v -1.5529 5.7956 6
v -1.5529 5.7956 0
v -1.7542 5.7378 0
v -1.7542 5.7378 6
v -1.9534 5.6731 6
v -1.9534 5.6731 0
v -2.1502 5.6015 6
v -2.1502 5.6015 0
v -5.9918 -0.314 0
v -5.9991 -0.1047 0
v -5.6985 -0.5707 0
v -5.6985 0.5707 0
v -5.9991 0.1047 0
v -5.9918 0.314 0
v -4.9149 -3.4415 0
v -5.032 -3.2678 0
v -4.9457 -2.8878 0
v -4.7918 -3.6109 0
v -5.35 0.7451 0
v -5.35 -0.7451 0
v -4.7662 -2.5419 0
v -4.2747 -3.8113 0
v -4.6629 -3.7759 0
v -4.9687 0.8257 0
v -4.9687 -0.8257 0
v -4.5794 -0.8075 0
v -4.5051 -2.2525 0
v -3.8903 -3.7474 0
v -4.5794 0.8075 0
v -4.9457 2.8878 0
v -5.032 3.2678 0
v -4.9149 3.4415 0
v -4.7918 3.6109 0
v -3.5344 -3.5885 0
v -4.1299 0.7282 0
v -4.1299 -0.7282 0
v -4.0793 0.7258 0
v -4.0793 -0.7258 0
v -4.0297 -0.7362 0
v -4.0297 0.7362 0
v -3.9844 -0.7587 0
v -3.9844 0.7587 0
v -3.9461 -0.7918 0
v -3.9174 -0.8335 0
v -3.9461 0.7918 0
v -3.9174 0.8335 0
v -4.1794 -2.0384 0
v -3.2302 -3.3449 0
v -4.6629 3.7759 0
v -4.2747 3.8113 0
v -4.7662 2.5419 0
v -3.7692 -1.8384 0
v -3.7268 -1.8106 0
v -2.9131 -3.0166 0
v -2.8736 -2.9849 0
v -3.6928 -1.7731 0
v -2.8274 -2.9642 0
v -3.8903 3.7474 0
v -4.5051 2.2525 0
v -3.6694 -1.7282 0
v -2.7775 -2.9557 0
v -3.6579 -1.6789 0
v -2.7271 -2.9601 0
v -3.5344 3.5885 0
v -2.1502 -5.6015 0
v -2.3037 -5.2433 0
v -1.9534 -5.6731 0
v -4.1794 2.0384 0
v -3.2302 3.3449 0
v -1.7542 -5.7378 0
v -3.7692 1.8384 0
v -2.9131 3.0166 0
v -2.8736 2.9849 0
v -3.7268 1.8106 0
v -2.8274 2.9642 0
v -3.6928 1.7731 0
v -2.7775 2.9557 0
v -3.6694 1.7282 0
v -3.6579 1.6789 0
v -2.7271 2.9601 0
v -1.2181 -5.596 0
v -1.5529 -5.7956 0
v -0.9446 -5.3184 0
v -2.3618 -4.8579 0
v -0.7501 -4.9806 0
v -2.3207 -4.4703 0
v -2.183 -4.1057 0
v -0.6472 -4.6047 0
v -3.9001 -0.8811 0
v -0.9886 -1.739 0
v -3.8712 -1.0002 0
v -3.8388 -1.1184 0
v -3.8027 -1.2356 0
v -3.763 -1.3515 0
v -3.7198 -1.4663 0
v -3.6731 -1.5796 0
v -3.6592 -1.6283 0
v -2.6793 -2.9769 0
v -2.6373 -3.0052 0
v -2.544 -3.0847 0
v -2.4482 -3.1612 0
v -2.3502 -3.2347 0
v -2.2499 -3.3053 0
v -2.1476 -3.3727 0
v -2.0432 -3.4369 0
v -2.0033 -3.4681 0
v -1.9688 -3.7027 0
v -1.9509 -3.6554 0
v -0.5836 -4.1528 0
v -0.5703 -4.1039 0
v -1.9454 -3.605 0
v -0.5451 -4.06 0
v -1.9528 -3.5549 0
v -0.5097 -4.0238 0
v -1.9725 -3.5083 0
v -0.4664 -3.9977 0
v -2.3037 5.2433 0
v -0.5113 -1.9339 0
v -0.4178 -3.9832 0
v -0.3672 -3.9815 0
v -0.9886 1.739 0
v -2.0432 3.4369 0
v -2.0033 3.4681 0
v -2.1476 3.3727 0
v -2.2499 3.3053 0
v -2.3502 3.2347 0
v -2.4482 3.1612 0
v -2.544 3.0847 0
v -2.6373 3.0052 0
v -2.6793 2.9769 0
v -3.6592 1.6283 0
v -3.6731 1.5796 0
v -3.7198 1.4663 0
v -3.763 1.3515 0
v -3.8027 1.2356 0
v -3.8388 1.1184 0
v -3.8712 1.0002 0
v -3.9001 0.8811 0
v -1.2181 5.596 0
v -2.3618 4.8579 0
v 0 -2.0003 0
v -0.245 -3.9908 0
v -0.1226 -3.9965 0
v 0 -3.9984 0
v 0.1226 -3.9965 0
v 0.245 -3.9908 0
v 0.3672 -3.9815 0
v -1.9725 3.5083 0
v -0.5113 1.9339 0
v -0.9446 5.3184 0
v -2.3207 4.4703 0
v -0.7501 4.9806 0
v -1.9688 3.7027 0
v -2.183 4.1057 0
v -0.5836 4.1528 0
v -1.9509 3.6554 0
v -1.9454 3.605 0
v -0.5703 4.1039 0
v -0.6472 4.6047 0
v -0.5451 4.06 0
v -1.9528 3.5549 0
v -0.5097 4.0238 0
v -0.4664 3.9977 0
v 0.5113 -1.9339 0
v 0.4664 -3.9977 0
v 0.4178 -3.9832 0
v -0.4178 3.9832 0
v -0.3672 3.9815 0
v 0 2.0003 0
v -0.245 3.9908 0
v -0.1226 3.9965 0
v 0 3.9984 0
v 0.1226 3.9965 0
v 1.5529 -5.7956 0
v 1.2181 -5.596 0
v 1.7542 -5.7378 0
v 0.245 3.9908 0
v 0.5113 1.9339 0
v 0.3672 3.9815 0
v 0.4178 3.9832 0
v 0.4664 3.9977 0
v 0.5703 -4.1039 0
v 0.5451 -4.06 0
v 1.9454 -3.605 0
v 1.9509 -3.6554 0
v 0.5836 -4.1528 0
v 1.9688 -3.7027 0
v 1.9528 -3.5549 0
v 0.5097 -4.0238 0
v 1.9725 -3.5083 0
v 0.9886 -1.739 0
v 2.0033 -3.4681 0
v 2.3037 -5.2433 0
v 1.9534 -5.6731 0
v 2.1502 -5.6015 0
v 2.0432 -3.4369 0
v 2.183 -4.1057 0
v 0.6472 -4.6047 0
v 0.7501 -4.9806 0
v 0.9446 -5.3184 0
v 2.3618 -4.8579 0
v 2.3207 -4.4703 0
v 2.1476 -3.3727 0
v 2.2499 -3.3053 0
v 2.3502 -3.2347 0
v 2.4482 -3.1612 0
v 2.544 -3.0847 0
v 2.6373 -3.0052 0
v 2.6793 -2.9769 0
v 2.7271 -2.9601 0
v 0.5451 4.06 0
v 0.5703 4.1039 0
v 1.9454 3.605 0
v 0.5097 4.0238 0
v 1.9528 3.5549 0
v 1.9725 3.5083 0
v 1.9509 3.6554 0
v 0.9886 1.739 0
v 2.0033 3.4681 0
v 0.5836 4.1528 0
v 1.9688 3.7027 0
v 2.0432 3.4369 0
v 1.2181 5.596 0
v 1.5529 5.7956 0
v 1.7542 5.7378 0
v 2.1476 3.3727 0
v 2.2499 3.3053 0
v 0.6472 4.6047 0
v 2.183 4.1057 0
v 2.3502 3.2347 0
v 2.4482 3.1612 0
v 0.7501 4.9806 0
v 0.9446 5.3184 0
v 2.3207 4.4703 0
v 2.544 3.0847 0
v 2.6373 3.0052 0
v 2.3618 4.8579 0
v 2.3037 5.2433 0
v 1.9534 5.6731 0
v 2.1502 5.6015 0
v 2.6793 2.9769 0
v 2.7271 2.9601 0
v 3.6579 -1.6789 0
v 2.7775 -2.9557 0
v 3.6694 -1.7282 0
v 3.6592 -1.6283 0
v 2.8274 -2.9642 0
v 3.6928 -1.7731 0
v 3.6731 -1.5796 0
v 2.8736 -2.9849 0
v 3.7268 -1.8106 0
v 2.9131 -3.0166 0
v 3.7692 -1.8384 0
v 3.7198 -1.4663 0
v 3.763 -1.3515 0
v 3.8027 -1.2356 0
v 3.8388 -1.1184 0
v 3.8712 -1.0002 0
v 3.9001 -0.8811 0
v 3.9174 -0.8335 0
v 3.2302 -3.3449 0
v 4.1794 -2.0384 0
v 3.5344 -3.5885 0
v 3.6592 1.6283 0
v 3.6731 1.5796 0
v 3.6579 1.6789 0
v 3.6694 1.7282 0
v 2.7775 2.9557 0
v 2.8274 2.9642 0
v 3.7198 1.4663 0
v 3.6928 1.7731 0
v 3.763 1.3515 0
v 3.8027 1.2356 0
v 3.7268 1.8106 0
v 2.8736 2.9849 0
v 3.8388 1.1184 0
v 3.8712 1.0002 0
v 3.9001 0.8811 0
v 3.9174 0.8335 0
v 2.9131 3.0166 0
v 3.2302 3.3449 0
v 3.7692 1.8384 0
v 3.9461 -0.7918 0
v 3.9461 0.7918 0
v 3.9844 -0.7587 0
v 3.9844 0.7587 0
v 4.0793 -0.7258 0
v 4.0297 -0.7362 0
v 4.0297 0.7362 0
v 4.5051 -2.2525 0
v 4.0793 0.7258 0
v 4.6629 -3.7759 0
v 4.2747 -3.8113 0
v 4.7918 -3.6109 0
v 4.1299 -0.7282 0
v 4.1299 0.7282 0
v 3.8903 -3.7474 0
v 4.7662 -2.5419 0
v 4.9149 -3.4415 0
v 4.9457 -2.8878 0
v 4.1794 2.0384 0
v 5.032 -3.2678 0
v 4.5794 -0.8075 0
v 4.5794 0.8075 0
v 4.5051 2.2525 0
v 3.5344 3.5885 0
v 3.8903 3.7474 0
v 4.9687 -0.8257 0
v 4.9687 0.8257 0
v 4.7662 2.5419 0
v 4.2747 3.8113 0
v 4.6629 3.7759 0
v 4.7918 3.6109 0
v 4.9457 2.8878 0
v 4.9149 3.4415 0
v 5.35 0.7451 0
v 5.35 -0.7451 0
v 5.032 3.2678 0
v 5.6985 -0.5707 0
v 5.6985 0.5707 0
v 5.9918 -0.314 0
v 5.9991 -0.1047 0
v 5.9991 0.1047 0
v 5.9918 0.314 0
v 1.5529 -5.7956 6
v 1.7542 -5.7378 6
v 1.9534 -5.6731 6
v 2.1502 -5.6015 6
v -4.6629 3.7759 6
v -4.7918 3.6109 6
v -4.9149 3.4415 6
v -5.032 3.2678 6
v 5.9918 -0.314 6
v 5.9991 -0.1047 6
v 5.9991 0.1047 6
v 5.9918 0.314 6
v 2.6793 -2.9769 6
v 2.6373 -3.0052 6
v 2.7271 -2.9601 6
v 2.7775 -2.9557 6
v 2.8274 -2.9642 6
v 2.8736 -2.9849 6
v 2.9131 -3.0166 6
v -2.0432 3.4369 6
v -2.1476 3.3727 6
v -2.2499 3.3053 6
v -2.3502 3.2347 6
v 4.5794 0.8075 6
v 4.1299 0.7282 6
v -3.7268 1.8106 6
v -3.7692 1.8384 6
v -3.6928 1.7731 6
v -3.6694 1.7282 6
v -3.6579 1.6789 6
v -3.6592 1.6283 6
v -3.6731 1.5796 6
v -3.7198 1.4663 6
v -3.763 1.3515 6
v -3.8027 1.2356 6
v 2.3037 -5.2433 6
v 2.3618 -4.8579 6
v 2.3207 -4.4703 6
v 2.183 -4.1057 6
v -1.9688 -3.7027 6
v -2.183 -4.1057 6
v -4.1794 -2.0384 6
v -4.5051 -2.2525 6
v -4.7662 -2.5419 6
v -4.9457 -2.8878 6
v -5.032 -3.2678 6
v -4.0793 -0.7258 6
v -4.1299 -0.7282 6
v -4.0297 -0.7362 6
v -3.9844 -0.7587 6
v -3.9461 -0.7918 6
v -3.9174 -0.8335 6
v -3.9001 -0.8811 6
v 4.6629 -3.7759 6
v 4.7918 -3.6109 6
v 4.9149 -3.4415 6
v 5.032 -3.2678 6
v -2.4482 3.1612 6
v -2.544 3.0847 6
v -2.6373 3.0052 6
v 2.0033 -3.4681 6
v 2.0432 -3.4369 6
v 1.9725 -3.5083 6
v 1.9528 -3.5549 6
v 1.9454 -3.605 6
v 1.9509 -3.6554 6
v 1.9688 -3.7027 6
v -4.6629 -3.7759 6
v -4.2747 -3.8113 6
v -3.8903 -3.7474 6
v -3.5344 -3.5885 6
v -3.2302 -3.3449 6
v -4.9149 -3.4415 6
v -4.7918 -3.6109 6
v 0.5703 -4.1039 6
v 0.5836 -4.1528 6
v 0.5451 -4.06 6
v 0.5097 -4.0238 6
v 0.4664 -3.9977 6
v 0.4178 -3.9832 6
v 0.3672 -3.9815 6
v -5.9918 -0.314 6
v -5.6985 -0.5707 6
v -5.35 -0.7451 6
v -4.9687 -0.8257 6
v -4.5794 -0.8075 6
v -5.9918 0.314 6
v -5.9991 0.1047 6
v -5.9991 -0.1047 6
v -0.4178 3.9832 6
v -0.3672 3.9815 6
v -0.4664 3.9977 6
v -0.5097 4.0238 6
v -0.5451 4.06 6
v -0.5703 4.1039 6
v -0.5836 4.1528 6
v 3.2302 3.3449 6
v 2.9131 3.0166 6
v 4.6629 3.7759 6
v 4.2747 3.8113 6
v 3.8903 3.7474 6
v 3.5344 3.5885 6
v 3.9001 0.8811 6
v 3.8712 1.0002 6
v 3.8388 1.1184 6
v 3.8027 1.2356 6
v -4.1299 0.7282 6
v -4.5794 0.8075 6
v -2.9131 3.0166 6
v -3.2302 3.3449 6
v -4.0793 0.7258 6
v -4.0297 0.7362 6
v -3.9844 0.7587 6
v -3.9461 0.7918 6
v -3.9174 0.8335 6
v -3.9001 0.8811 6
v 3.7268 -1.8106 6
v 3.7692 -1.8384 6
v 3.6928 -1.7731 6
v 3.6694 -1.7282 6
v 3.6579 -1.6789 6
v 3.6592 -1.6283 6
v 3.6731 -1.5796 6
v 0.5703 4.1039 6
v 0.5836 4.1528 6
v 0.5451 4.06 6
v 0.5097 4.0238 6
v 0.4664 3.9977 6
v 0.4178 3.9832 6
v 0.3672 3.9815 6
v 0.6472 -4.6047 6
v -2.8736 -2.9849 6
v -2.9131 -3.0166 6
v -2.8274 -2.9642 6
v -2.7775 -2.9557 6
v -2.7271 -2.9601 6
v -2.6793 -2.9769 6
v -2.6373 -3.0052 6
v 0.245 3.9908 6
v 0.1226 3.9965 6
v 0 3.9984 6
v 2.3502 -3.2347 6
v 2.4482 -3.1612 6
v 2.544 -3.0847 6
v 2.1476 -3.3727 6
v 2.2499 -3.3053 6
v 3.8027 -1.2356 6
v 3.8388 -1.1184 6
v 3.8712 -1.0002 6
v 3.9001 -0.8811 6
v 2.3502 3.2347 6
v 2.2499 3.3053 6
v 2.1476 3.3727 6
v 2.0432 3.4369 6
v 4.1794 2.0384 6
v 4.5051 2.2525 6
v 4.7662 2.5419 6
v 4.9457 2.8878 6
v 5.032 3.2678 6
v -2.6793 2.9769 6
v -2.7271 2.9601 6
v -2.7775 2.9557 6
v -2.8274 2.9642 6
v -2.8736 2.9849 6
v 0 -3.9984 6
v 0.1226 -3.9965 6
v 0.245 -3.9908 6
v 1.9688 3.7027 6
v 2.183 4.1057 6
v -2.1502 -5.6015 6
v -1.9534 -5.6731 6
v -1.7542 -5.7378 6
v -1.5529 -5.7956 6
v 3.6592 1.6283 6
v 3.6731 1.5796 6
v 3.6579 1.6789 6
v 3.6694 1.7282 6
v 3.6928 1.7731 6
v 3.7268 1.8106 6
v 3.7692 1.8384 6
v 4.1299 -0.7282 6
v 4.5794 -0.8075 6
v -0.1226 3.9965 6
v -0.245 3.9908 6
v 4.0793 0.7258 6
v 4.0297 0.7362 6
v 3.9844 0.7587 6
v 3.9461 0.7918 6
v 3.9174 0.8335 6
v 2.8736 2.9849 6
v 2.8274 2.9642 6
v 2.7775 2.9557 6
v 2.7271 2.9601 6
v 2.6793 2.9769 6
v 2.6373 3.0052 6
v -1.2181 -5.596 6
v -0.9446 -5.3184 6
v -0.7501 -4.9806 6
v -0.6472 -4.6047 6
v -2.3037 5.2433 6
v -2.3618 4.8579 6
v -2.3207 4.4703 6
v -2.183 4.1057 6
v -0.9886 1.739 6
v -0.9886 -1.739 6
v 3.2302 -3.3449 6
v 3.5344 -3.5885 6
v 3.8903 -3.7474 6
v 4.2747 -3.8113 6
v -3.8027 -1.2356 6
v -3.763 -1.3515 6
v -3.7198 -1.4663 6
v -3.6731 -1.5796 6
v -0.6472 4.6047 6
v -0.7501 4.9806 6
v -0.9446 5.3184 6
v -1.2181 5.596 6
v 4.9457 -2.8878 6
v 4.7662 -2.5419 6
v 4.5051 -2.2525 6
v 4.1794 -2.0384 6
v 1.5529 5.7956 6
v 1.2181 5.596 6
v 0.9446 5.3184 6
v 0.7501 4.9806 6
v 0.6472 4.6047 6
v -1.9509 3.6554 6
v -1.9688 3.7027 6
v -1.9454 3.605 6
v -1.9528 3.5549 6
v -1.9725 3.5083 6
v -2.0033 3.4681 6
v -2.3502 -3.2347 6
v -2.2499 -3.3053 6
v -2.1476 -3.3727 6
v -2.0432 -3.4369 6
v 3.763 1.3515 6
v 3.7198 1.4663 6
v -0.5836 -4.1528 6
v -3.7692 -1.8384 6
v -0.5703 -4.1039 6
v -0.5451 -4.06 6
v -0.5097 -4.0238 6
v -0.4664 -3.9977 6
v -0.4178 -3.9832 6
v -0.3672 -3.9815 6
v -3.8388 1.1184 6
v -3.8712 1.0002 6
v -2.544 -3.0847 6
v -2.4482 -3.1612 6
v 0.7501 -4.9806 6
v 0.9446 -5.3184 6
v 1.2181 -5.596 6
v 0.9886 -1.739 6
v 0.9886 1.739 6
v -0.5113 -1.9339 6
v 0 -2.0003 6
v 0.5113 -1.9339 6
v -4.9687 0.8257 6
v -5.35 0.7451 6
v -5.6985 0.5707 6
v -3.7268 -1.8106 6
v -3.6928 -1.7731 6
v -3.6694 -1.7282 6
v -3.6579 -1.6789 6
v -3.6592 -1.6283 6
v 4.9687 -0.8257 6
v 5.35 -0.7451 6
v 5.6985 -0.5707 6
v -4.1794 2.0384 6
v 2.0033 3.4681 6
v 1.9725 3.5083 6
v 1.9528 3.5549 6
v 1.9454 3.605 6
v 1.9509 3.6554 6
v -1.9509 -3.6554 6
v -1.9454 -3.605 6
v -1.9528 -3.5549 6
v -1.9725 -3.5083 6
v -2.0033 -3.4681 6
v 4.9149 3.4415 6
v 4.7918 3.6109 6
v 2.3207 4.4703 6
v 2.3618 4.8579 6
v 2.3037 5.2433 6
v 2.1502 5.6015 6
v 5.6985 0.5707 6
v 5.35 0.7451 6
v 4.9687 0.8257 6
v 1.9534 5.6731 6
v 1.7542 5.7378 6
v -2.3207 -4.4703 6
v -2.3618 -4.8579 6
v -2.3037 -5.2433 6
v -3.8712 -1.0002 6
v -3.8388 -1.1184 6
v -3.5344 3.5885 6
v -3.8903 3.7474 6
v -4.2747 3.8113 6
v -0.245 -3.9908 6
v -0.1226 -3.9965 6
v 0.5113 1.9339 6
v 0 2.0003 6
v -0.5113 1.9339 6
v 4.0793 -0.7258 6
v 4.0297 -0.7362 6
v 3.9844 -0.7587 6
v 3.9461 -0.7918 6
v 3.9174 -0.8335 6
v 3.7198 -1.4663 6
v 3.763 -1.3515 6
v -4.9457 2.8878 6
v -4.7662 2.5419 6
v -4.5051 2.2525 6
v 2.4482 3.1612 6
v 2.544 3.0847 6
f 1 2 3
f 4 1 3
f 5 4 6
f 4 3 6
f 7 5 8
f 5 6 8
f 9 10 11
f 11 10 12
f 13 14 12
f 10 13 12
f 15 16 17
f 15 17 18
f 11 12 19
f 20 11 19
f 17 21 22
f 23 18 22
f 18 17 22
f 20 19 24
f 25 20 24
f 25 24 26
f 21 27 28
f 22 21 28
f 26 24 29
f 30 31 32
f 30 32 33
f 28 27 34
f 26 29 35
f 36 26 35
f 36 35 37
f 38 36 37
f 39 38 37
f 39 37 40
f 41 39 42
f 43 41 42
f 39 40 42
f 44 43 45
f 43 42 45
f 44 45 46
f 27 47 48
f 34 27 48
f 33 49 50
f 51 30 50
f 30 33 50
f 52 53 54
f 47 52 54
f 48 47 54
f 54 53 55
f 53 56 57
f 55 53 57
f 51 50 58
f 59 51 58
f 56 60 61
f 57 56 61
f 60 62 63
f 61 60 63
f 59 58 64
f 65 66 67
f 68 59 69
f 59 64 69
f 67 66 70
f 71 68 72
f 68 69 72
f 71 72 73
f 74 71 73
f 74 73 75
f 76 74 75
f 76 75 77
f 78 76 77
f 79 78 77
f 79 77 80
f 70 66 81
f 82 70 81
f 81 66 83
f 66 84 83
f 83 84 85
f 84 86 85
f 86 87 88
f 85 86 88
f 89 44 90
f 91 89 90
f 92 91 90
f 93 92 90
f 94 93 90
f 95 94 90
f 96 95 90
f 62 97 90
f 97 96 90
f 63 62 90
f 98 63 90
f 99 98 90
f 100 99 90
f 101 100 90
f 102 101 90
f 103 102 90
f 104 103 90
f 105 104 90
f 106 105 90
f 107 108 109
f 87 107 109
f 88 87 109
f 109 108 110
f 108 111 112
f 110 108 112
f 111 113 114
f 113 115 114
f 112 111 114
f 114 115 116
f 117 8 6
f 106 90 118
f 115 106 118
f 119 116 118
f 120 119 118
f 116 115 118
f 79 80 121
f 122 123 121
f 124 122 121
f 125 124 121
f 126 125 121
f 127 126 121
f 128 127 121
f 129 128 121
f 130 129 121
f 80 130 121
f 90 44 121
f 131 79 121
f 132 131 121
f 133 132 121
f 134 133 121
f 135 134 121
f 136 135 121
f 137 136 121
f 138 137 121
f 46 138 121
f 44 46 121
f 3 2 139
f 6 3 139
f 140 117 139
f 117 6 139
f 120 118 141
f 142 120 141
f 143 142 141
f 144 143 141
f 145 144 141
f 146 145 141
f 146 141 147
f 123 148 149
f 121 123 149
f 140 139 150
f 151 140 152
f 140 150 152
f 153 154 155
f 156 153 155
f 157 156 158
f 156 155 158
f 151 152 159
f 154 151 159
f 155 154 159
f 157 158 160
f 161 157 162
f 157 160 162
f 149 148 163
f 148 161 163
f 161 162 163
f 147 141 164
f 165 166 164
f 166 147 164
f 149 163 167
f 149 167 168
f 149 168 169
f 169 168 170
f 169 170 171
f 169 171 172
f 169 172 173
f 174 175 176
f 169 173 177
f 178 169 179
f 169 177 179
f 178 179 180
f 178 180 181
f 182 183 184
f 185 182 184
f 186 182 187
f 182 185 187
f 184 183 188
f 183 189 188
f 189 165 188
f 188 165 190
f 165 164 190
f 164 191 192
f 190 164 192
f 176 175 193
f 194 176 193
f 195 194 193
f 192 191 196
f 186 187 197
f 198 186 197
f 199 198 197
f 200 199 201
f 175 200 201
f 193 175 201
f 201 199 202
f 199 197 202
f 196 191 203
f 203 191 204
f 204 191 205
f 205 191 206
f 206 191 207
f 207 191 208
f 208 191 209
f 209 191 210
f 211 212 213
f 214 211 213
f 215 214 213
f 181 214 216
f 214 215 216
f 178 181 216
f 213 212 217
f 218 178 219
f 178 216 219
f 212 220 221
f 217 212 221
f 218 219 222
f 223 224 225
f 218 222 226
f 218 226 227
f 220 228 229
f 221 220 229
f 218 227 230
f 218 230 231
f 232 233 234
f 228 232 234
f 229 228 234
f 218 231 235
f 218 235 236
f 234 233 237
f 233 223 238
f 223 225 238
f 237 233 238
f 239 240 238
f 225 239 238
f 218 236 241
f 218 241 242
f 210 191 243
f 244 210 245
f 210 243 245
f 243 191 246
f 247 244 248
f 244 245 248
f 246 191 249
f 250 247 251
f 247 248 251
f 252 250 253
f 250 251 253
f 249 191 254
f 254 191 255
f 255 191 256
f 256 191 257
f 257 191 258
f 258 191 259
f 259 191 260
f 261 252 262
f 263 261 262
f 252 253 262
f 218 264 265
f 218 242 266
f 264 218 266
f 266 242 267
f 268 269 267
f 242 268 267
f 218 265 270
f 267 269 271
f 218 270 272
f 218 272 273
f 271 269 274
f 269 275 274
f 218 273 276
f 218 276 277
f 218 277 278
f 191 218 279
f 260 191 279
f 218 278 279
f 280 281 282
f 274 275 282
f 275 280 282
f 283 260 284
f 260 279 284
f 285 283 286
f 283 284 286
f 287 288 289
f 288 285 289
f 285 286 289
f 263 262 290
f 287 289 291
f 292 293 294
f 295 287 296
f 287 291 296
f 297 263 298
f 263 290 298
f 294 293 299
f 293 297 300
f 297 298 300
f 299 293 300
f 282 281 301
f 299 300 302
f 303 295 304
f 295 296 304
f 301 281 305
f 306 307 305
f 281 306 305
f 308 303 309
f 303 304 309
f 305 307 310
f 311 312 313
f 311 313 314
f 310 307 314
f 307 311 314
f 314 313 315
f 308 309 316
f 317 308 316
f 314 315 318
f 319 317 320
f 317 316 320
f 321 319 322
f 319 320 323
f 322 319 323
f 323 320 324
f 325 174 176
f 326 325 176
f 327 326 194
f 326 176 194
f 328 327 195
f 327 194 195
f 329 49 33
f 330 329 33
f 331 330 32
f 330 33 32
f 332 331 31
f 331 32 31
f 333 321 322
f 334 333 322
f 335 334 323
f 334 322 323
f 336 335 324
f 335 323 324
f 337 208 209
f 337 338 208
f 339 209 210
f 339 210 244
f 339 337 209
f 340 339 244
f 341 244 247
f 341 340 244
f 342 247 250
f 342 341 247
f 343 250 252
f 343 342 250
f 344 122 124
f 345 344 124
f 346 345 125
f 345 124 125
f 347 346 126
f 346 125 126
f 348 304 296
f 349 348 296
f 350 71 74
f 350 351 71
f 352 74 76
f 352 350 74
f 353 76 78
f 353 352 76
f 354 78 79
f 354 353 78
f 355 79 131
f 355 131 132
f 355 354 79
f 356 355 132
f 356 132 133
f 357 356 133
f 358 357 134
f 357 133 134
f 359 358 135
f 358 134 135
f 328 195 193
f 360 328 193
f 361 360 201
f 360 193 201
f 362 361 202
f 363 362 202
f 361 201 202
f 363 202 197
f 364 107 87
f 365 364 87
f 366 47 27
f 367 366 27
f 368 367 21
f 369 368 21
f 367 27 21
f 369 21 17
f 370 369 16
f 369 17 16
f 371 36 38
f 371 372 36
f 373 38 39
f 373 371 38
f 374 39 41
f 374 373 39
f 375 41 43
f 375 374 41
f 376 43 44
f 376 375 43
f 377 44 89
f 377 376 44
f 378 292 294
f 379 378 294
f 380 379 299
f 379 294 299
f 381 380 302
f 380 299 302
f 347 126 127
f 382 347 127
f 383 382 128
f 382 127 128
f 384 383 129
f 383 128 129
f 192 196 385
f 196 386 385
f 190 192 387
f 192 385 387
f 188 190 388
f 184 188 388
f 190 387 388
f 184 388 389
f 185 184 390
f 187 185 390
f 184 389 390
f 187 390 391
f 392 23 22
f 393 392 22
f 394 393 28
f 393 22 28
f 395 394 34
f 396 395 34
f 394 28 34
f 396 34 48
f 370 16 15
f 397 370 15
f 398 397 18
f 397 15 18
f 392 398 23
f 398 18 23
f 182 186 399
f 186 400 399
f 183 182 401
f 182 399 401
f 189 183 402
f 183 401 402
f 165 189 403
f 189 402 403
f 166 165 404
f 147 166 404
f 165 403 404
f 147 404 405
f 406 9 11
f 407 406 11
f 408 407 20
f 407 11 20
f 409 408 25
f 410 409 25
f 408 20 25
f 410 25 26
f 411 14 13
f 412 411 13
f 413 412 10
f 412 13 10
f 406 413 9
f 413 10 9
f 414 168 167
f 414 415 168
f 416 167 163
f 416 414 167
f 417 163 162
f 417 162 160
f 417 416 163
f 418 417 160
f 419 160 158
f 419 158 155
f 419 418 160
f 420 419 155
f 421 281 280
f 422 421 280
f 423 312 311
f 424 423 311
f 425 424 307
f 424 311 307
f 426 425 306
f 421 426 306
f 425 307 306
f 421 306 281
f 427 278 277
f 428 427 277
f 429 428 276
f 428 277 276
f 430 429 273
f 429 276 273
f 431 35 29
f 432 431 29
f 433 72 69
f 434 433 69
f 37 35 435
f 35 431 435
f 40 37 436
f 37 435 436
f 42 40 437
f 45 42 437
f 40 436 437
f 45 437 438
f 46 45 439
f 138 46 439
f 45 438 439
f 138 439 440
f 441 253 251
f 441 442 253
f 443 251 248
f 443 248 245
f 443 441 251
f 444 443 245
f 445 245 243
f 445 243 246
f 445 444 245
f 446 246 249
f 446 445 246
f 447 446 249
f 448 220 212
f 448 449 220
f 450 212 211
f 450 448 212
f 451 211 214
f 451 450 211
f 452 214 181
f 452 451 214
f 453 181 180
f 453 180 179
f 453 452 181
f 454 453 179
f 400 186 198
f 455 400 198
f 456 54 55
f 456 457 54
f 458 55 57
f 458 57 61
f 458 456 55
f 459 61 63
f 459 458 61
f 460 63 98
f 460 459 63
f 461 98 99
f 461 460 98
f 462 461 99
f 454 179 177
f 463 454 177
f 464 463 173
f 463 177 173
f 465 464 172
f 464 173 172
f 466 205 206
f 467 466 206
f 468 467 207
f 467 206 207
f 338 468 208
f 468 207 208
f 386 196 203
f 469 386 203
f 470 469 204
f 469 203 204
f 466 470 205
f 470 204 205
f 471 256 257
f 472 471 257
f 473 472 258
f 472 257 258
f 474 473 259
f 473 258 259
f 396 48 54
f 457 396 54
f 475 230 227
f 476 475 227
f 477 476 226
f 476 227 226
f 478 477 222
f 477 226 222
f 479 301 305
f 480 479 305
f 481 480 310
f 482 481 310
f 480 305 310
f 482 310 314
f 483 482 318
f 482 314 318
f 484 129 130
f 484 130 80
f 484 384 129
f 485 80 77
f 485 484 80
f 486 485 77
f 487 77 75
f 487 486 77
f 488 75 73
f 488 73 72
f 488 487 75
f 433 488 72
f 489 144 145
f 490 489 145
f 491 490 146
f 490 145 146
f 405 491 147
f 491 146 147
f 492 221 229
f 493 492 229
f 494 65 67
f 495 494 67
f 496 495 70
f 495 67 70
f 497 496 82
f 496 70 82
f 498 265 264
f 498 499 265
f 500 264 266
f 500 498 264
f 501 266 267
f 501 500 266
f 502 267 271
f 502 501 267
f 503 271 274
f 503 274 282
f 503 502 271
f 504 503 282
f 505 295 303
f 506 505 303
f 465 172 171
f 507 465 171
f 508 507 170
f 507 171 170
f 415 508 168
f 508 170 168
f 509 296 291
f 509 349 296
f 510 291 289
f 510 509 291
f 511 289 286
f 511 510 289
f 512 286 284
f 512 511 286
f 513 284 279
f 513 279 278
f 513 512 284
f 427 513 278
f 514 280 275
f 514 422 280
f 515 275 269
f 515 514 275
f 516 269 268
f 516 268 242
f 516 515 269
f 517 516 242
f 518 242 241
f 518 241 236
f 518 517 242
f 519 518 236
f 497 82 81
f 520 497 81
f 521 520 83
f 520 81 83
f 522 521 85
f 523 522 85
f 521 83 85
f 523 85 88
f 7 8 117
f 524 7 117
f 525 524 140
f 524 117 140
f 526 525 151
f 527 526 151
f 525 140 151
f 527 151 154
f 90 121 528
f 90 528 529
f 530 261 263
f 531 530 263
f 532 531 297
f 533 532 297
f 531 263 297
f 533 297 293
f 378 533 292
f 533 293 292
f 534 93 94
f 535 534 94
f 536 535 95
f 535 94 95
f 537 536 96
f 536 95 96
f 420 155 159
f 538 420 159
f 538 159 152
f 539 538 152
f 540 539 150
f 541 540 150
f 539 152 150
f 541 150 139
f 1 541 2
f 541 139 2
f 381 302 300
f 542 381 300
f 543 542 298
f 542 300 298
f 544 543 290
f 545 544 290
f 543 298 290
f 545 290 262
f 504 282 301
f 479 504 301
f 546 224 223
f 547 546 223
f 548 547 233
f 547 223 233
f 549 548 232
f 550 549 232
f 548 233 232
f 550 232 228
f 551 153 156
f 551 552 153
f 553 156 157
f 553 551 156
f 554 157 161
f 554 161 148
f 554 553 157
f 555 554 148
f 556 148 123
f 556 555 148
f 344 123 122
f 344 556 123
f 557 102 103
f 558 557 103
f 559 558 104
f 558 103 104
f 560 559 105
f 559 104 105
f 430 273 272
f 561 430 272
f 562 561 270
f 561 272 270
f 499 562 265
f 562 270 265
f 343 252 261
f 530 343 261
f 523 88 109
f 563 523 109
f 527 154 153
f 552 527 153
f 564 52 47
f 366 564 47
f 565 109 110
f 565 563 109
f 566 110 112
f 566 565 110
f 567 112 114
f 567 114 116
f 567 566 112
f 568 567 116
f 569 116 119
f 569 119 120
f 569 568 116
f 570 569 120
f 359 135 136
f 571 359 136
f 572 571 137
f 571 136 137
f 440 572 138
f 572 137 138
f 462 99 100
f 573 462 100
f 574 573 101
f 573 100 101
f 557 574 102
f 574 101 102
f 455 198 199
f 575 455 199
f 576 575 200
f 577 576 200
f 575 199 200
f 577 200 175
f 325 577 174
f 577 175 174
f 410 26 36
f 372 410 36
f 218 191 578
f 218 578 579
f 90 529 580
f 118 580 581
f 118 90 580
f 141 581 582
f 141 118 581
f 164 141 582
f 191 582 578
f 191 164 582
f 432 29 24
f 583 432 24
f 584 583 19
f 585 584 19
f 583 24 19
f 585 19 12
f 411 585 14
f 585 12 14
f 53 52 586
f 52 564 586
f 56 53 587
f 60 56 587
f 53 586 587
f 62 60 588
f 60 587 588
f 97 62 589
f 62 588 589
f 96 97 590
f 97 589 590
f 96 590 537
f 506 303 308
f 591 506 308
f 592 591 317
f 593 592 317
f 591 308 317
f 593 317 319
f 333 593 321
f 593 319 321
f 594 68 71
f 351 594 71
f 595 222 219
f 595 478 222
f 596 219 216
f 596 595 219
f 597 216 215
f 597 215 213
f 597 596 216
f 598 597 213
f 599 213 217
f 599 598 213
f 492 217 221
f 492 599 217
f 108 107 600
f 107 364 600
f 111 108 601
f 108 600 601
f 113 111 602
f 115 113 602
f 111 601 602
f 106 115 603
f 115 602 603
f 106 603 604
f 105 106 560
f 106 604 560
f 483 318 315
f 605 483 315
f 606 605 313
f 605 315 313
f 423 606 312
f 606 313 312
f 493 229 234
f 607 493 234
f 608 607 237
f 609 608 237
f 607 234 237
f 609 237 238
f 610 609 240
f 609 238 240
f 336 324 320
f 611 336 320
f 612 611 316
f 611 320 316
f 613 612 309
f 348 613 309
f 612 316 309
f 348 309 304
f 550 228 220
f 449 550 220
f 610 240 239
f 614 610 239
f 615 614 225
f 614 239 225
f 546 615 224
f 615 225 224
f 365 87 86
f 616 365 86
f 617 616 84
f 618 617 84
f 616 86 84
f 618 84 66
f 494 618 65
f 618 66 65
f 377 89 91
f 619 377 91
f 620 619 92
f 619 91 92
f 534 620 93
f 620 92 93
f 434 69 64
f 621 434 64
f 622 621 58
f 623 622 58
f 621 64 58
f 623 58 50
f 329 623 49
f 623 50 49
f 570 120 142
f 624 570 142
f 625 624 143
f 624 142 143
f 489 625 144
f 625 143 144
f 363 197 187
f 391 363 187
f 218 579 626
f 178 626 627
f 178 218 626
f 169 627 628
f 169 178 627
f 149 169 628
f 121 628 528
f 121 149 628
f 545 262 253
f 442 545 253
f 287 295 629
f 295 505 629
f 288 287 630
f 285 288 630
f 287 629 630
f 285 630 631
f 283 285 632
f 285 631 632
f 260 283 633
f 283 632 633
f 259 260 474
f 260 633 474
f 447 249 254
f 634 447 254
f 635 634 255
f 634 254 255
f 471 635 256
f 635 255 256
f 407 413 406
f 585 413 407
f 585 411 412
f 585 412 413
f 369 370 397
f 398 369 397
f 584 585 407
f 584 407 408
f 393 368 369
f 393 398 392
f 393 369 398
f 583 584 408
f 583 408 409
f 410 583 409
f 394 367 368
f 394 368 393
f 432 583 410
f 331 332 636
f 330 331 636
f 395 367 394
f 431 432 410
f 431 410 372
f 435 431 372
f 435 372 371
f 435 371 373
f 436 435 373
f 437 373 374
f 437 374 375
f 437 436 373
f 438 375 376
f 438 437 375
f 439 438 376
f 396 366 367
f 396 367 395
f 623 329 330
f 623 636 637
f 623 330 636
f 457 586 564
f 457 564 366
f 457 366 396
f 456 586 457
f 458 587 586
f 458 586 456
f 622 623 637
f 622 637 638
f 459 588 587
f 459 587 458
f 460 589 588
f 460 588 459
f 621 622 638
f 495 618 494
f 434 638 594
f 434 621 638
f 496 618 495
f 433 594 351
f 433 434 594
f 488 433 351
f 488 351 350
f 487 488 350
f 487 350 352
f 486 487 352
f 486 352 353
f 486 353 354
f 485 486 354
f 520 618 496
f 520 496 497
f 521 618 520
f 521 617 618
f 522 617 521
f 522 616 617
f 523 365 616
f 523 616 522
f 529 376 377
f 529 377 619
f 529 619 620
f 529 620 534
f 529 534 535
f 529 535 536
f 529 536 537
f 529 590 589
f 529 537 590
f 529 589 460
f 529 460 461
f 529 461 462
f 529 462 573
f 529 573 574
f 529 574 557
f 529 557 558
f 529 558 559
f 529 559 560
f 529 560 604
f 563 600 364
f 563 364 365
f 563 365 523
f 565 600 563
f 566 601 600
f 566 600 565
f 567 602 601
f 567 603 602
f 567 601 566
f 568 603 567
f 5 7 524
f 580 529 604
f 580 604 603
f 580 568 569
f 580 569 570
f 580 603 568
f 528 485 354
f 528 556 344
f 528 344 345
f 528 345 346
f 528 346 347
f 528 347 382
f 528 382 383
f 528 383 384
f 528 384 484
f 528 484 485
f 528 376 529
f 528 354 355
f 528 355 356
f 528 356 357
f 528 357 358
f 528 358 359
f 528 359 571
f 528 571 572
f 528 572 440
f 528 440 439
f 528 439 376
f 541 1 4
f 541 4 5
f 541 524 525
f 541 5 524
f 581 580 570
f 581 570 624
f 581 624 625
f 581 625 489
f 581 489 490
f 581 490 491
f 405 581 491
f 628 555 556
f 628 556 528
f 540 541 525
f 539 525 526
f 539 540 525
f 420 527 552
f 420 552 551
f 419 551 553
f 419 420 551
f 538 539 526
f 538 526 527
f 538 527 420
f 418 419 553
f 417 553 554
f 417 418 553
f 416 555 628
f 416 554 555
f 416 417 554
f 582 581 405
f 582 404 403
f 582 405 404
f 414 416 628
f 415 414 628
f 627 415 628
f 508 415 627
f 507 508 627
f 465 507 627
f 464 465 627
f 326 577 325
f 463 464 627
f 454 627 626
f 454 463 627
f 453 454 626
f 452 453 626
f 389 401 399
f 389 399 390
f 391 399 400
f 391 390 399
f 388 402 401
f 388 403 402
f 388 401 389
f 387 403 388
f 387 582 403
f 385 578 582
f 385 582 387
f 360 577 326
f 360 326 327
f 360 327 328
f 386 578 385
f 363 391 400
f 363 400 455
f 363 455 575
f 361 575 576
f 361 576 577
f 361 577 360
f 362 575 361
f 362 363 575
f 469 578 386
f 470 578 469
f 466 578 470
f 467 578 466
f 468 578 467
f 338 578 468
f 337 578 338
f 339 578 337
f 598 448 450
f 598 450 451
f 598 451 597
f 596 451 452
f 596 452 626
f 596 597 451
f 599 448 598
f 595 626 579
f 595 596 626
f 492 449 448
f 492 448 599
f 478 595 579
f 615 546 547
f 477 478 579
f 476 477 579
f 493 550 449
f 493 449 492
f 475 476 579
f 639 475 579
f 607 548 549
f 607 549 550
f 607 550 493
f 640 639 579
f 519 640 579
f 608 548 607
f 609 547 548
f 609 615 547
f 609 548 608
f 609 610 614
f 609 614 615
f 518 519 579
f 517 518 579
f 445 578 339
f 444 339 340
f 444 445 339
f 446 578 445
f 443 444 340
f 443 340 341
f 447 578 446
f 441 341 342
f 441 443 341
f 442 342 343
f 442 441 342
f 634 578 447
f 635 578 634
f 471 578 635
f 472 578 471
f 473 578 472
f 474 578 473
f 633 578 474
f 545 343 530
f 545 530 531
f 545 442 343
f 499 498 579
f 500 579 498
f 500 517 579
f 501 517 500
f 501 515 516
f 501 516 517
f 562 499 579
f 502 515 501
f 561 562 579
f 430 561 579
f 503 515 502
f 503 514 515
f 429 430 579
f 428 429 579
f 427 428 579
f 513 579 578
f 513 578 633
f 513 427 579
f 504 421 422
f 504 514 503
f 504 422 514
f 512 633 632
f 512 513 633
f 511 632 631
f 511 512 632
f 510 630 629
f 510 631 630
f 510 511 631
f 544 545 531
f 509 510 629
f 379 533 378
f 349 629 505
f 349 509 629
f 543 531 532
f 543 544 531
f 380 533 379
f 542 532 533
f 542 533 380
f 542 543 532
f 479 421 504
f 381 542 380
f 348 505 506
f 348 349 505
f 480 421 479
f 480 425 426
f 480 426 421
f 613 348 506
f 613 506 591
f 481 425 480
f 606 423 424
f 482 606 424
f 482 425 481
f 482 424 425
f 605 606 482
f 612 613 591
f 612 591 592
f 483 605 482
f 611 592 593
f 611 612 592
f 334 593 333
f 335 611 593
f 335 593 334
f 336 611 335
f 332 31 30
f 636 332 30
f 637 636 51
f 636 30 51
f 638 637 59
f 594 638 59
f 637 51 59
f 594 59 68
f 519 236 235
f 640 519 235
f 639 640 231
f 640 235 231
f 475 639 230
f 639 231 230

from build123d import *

# Parameters (mm, degrees)
BOSS_EXTRUDE1_DEPTH      = 6
FILLET3_R                = 0.2
FILLET4_R                = 0.2
CIRPATTERN1_COUNT        = 10
FILLET3_OF_CIRPATTERN1_R = 0.2
FILLET4_OF_CIRPATTERN1_R = 0.2
CUT_EXTRUDE1_DEPTH       = 7
CUT_EXTRUDE1_DEPTH_BACK  = 6


with BuildPart() as part:
    # Sketch1 → Boss-Extrude1 (new body)
    with BuildSketch(Plane.XY):
        with BuildLine():
            Line((0, 0), (3.80266937, -1.235562177))
            ThreePointArc((3.80266937, -1.235562177), (3.87959472, -0.967291603), (3.937619073, -0.694308482))
            Line((3.937619073, -0.694308482), (4.579356052, -0.807464026))
            ThreePointArc((4.579356052, -0.807464026), (5.349965783, -0.745072725), (5.991777209, -0.314015737))
            ThreePointArc((5.991777209, -0.314015737), (6, 0), (5.991777209, 0.314015737))
            ThreePointArc((5.991777209, 0.314015737), (5.349965783, 0.745072725), (4.579356052, 0.807464026))
            Line((4.579356052, 0.807464026), (3.937619073, 0.694308482))
            ThreePointArc((3.937619073, 0.694308482), (3.87959472, 0.967291603), (3.80266937, 1.235562177))
            Line((3.80266937, 1.235562177), (0, 0))
        make_face()
    boss_extrude1 = extrude(amount=BOSS_EXTRUDE1_DEPTH)

    # Fillet3
    fillet3_edges = [part.edges().sort_by_distance(p)[0] for p in [
        (3.937619073, 0.694308482, 3),
    ]]
    fillet(fillet3_edges, radius=FILLET3_R)

    # Fillet4
    fillet4_edges = [part.edges().sort_by_distance(p)[0] for p in [
        (3.937619073, -0.694308482, 3),
    ]]
    fillet(fillet4_edges, radius=FILLET4_R)

    # CirPattern1: Boss-Extrude1 ×10 about axis
    cirpattern1_axis = Axis((0, 0, 0), (0, 0, 1))
    for i in range(1, CIRPATTERN1_COUNT):
        add(boss_extrude1.rotate(cirpattern1_axis, i * 360 / CIRPATTERN1_COUNT))

    # Fillet3 of CirPattern1
    fillet3_of_cirpattern1_edges = [part.edges().sort_by_distance(p)[0] for p in [
        (2.777496461, 2.876181782, 3),
        (0.556464605, 3.959451399, 3),
        (-1.877117817, 3.530345158, 3),
        (-3.593705034, 1.752767059, 3),
        (-3.937619073, -0.694308482, 3),
        (-2.777496461, -2.876181782, 3),
        (-0.556464605, -3.959451399, 3),
        (1.877117817, -3.530345158, 3),
        (3.593705034, -1.752767059, 3),
    ]]
    fillet(fillet3_of_cirpattern1_edges, radius=FILLET3_OF_CIRPATTERN1_R)

    # Fillet4 of CirPattern1
    fillet4_of_cirpattern1_edges = [part.edges().sort_by_distance(p)[0] for p in [
        (3.593705034, 1.752767059, 3),
        (1.877117817, 3.530345158, 3),
        (-0.556464605, 3.959451399, 3),
        (-2.777496461, 2.876181782, 3),
        (-3.937619073, 0.694308482, 3),
        (-3.593705034, -1.752767059, 3),
        (-1.877117817, -3.530345158, 3),
        (0.556464605, -3.959451399, 3),
        (2.777496461, -2.876181782, 3),
    ]]
    fillet(fillet4_of_cirpattern1_edges, radius=FILLET4_OF_CIRPATTERN1_R)

    # Sketch2 → Cut-Extrude1 (cut, two sides)
    with BuildSketch(Plane.XY) as cut_extrude1_sk:
        with BuildLine():
            Line((-0.988569227, 1.739), (-0.988569227, -1.739))
            ThreePointArc((-0.988569227, -1.739), (0, -2.000347499), (0.988569227, -1.739))
            Line((0.988569227, -1.739), (0.988569227, 1.739))
            ThreePointArc((0.988569227, 1.739), (0, 2.000347499), (-0.988569227, 1.739))
        make_face()
    extrude(amount=CUT_EXTRUDE1_DEPTH, mode=Mode.SUBTRACT)
    extrude(cut_extrude1_sk.sketch, amount=-CUT_EXTRUDE1_DEPTH_BACK, mode=Mode.SUBTRACT)


solid = part.part
